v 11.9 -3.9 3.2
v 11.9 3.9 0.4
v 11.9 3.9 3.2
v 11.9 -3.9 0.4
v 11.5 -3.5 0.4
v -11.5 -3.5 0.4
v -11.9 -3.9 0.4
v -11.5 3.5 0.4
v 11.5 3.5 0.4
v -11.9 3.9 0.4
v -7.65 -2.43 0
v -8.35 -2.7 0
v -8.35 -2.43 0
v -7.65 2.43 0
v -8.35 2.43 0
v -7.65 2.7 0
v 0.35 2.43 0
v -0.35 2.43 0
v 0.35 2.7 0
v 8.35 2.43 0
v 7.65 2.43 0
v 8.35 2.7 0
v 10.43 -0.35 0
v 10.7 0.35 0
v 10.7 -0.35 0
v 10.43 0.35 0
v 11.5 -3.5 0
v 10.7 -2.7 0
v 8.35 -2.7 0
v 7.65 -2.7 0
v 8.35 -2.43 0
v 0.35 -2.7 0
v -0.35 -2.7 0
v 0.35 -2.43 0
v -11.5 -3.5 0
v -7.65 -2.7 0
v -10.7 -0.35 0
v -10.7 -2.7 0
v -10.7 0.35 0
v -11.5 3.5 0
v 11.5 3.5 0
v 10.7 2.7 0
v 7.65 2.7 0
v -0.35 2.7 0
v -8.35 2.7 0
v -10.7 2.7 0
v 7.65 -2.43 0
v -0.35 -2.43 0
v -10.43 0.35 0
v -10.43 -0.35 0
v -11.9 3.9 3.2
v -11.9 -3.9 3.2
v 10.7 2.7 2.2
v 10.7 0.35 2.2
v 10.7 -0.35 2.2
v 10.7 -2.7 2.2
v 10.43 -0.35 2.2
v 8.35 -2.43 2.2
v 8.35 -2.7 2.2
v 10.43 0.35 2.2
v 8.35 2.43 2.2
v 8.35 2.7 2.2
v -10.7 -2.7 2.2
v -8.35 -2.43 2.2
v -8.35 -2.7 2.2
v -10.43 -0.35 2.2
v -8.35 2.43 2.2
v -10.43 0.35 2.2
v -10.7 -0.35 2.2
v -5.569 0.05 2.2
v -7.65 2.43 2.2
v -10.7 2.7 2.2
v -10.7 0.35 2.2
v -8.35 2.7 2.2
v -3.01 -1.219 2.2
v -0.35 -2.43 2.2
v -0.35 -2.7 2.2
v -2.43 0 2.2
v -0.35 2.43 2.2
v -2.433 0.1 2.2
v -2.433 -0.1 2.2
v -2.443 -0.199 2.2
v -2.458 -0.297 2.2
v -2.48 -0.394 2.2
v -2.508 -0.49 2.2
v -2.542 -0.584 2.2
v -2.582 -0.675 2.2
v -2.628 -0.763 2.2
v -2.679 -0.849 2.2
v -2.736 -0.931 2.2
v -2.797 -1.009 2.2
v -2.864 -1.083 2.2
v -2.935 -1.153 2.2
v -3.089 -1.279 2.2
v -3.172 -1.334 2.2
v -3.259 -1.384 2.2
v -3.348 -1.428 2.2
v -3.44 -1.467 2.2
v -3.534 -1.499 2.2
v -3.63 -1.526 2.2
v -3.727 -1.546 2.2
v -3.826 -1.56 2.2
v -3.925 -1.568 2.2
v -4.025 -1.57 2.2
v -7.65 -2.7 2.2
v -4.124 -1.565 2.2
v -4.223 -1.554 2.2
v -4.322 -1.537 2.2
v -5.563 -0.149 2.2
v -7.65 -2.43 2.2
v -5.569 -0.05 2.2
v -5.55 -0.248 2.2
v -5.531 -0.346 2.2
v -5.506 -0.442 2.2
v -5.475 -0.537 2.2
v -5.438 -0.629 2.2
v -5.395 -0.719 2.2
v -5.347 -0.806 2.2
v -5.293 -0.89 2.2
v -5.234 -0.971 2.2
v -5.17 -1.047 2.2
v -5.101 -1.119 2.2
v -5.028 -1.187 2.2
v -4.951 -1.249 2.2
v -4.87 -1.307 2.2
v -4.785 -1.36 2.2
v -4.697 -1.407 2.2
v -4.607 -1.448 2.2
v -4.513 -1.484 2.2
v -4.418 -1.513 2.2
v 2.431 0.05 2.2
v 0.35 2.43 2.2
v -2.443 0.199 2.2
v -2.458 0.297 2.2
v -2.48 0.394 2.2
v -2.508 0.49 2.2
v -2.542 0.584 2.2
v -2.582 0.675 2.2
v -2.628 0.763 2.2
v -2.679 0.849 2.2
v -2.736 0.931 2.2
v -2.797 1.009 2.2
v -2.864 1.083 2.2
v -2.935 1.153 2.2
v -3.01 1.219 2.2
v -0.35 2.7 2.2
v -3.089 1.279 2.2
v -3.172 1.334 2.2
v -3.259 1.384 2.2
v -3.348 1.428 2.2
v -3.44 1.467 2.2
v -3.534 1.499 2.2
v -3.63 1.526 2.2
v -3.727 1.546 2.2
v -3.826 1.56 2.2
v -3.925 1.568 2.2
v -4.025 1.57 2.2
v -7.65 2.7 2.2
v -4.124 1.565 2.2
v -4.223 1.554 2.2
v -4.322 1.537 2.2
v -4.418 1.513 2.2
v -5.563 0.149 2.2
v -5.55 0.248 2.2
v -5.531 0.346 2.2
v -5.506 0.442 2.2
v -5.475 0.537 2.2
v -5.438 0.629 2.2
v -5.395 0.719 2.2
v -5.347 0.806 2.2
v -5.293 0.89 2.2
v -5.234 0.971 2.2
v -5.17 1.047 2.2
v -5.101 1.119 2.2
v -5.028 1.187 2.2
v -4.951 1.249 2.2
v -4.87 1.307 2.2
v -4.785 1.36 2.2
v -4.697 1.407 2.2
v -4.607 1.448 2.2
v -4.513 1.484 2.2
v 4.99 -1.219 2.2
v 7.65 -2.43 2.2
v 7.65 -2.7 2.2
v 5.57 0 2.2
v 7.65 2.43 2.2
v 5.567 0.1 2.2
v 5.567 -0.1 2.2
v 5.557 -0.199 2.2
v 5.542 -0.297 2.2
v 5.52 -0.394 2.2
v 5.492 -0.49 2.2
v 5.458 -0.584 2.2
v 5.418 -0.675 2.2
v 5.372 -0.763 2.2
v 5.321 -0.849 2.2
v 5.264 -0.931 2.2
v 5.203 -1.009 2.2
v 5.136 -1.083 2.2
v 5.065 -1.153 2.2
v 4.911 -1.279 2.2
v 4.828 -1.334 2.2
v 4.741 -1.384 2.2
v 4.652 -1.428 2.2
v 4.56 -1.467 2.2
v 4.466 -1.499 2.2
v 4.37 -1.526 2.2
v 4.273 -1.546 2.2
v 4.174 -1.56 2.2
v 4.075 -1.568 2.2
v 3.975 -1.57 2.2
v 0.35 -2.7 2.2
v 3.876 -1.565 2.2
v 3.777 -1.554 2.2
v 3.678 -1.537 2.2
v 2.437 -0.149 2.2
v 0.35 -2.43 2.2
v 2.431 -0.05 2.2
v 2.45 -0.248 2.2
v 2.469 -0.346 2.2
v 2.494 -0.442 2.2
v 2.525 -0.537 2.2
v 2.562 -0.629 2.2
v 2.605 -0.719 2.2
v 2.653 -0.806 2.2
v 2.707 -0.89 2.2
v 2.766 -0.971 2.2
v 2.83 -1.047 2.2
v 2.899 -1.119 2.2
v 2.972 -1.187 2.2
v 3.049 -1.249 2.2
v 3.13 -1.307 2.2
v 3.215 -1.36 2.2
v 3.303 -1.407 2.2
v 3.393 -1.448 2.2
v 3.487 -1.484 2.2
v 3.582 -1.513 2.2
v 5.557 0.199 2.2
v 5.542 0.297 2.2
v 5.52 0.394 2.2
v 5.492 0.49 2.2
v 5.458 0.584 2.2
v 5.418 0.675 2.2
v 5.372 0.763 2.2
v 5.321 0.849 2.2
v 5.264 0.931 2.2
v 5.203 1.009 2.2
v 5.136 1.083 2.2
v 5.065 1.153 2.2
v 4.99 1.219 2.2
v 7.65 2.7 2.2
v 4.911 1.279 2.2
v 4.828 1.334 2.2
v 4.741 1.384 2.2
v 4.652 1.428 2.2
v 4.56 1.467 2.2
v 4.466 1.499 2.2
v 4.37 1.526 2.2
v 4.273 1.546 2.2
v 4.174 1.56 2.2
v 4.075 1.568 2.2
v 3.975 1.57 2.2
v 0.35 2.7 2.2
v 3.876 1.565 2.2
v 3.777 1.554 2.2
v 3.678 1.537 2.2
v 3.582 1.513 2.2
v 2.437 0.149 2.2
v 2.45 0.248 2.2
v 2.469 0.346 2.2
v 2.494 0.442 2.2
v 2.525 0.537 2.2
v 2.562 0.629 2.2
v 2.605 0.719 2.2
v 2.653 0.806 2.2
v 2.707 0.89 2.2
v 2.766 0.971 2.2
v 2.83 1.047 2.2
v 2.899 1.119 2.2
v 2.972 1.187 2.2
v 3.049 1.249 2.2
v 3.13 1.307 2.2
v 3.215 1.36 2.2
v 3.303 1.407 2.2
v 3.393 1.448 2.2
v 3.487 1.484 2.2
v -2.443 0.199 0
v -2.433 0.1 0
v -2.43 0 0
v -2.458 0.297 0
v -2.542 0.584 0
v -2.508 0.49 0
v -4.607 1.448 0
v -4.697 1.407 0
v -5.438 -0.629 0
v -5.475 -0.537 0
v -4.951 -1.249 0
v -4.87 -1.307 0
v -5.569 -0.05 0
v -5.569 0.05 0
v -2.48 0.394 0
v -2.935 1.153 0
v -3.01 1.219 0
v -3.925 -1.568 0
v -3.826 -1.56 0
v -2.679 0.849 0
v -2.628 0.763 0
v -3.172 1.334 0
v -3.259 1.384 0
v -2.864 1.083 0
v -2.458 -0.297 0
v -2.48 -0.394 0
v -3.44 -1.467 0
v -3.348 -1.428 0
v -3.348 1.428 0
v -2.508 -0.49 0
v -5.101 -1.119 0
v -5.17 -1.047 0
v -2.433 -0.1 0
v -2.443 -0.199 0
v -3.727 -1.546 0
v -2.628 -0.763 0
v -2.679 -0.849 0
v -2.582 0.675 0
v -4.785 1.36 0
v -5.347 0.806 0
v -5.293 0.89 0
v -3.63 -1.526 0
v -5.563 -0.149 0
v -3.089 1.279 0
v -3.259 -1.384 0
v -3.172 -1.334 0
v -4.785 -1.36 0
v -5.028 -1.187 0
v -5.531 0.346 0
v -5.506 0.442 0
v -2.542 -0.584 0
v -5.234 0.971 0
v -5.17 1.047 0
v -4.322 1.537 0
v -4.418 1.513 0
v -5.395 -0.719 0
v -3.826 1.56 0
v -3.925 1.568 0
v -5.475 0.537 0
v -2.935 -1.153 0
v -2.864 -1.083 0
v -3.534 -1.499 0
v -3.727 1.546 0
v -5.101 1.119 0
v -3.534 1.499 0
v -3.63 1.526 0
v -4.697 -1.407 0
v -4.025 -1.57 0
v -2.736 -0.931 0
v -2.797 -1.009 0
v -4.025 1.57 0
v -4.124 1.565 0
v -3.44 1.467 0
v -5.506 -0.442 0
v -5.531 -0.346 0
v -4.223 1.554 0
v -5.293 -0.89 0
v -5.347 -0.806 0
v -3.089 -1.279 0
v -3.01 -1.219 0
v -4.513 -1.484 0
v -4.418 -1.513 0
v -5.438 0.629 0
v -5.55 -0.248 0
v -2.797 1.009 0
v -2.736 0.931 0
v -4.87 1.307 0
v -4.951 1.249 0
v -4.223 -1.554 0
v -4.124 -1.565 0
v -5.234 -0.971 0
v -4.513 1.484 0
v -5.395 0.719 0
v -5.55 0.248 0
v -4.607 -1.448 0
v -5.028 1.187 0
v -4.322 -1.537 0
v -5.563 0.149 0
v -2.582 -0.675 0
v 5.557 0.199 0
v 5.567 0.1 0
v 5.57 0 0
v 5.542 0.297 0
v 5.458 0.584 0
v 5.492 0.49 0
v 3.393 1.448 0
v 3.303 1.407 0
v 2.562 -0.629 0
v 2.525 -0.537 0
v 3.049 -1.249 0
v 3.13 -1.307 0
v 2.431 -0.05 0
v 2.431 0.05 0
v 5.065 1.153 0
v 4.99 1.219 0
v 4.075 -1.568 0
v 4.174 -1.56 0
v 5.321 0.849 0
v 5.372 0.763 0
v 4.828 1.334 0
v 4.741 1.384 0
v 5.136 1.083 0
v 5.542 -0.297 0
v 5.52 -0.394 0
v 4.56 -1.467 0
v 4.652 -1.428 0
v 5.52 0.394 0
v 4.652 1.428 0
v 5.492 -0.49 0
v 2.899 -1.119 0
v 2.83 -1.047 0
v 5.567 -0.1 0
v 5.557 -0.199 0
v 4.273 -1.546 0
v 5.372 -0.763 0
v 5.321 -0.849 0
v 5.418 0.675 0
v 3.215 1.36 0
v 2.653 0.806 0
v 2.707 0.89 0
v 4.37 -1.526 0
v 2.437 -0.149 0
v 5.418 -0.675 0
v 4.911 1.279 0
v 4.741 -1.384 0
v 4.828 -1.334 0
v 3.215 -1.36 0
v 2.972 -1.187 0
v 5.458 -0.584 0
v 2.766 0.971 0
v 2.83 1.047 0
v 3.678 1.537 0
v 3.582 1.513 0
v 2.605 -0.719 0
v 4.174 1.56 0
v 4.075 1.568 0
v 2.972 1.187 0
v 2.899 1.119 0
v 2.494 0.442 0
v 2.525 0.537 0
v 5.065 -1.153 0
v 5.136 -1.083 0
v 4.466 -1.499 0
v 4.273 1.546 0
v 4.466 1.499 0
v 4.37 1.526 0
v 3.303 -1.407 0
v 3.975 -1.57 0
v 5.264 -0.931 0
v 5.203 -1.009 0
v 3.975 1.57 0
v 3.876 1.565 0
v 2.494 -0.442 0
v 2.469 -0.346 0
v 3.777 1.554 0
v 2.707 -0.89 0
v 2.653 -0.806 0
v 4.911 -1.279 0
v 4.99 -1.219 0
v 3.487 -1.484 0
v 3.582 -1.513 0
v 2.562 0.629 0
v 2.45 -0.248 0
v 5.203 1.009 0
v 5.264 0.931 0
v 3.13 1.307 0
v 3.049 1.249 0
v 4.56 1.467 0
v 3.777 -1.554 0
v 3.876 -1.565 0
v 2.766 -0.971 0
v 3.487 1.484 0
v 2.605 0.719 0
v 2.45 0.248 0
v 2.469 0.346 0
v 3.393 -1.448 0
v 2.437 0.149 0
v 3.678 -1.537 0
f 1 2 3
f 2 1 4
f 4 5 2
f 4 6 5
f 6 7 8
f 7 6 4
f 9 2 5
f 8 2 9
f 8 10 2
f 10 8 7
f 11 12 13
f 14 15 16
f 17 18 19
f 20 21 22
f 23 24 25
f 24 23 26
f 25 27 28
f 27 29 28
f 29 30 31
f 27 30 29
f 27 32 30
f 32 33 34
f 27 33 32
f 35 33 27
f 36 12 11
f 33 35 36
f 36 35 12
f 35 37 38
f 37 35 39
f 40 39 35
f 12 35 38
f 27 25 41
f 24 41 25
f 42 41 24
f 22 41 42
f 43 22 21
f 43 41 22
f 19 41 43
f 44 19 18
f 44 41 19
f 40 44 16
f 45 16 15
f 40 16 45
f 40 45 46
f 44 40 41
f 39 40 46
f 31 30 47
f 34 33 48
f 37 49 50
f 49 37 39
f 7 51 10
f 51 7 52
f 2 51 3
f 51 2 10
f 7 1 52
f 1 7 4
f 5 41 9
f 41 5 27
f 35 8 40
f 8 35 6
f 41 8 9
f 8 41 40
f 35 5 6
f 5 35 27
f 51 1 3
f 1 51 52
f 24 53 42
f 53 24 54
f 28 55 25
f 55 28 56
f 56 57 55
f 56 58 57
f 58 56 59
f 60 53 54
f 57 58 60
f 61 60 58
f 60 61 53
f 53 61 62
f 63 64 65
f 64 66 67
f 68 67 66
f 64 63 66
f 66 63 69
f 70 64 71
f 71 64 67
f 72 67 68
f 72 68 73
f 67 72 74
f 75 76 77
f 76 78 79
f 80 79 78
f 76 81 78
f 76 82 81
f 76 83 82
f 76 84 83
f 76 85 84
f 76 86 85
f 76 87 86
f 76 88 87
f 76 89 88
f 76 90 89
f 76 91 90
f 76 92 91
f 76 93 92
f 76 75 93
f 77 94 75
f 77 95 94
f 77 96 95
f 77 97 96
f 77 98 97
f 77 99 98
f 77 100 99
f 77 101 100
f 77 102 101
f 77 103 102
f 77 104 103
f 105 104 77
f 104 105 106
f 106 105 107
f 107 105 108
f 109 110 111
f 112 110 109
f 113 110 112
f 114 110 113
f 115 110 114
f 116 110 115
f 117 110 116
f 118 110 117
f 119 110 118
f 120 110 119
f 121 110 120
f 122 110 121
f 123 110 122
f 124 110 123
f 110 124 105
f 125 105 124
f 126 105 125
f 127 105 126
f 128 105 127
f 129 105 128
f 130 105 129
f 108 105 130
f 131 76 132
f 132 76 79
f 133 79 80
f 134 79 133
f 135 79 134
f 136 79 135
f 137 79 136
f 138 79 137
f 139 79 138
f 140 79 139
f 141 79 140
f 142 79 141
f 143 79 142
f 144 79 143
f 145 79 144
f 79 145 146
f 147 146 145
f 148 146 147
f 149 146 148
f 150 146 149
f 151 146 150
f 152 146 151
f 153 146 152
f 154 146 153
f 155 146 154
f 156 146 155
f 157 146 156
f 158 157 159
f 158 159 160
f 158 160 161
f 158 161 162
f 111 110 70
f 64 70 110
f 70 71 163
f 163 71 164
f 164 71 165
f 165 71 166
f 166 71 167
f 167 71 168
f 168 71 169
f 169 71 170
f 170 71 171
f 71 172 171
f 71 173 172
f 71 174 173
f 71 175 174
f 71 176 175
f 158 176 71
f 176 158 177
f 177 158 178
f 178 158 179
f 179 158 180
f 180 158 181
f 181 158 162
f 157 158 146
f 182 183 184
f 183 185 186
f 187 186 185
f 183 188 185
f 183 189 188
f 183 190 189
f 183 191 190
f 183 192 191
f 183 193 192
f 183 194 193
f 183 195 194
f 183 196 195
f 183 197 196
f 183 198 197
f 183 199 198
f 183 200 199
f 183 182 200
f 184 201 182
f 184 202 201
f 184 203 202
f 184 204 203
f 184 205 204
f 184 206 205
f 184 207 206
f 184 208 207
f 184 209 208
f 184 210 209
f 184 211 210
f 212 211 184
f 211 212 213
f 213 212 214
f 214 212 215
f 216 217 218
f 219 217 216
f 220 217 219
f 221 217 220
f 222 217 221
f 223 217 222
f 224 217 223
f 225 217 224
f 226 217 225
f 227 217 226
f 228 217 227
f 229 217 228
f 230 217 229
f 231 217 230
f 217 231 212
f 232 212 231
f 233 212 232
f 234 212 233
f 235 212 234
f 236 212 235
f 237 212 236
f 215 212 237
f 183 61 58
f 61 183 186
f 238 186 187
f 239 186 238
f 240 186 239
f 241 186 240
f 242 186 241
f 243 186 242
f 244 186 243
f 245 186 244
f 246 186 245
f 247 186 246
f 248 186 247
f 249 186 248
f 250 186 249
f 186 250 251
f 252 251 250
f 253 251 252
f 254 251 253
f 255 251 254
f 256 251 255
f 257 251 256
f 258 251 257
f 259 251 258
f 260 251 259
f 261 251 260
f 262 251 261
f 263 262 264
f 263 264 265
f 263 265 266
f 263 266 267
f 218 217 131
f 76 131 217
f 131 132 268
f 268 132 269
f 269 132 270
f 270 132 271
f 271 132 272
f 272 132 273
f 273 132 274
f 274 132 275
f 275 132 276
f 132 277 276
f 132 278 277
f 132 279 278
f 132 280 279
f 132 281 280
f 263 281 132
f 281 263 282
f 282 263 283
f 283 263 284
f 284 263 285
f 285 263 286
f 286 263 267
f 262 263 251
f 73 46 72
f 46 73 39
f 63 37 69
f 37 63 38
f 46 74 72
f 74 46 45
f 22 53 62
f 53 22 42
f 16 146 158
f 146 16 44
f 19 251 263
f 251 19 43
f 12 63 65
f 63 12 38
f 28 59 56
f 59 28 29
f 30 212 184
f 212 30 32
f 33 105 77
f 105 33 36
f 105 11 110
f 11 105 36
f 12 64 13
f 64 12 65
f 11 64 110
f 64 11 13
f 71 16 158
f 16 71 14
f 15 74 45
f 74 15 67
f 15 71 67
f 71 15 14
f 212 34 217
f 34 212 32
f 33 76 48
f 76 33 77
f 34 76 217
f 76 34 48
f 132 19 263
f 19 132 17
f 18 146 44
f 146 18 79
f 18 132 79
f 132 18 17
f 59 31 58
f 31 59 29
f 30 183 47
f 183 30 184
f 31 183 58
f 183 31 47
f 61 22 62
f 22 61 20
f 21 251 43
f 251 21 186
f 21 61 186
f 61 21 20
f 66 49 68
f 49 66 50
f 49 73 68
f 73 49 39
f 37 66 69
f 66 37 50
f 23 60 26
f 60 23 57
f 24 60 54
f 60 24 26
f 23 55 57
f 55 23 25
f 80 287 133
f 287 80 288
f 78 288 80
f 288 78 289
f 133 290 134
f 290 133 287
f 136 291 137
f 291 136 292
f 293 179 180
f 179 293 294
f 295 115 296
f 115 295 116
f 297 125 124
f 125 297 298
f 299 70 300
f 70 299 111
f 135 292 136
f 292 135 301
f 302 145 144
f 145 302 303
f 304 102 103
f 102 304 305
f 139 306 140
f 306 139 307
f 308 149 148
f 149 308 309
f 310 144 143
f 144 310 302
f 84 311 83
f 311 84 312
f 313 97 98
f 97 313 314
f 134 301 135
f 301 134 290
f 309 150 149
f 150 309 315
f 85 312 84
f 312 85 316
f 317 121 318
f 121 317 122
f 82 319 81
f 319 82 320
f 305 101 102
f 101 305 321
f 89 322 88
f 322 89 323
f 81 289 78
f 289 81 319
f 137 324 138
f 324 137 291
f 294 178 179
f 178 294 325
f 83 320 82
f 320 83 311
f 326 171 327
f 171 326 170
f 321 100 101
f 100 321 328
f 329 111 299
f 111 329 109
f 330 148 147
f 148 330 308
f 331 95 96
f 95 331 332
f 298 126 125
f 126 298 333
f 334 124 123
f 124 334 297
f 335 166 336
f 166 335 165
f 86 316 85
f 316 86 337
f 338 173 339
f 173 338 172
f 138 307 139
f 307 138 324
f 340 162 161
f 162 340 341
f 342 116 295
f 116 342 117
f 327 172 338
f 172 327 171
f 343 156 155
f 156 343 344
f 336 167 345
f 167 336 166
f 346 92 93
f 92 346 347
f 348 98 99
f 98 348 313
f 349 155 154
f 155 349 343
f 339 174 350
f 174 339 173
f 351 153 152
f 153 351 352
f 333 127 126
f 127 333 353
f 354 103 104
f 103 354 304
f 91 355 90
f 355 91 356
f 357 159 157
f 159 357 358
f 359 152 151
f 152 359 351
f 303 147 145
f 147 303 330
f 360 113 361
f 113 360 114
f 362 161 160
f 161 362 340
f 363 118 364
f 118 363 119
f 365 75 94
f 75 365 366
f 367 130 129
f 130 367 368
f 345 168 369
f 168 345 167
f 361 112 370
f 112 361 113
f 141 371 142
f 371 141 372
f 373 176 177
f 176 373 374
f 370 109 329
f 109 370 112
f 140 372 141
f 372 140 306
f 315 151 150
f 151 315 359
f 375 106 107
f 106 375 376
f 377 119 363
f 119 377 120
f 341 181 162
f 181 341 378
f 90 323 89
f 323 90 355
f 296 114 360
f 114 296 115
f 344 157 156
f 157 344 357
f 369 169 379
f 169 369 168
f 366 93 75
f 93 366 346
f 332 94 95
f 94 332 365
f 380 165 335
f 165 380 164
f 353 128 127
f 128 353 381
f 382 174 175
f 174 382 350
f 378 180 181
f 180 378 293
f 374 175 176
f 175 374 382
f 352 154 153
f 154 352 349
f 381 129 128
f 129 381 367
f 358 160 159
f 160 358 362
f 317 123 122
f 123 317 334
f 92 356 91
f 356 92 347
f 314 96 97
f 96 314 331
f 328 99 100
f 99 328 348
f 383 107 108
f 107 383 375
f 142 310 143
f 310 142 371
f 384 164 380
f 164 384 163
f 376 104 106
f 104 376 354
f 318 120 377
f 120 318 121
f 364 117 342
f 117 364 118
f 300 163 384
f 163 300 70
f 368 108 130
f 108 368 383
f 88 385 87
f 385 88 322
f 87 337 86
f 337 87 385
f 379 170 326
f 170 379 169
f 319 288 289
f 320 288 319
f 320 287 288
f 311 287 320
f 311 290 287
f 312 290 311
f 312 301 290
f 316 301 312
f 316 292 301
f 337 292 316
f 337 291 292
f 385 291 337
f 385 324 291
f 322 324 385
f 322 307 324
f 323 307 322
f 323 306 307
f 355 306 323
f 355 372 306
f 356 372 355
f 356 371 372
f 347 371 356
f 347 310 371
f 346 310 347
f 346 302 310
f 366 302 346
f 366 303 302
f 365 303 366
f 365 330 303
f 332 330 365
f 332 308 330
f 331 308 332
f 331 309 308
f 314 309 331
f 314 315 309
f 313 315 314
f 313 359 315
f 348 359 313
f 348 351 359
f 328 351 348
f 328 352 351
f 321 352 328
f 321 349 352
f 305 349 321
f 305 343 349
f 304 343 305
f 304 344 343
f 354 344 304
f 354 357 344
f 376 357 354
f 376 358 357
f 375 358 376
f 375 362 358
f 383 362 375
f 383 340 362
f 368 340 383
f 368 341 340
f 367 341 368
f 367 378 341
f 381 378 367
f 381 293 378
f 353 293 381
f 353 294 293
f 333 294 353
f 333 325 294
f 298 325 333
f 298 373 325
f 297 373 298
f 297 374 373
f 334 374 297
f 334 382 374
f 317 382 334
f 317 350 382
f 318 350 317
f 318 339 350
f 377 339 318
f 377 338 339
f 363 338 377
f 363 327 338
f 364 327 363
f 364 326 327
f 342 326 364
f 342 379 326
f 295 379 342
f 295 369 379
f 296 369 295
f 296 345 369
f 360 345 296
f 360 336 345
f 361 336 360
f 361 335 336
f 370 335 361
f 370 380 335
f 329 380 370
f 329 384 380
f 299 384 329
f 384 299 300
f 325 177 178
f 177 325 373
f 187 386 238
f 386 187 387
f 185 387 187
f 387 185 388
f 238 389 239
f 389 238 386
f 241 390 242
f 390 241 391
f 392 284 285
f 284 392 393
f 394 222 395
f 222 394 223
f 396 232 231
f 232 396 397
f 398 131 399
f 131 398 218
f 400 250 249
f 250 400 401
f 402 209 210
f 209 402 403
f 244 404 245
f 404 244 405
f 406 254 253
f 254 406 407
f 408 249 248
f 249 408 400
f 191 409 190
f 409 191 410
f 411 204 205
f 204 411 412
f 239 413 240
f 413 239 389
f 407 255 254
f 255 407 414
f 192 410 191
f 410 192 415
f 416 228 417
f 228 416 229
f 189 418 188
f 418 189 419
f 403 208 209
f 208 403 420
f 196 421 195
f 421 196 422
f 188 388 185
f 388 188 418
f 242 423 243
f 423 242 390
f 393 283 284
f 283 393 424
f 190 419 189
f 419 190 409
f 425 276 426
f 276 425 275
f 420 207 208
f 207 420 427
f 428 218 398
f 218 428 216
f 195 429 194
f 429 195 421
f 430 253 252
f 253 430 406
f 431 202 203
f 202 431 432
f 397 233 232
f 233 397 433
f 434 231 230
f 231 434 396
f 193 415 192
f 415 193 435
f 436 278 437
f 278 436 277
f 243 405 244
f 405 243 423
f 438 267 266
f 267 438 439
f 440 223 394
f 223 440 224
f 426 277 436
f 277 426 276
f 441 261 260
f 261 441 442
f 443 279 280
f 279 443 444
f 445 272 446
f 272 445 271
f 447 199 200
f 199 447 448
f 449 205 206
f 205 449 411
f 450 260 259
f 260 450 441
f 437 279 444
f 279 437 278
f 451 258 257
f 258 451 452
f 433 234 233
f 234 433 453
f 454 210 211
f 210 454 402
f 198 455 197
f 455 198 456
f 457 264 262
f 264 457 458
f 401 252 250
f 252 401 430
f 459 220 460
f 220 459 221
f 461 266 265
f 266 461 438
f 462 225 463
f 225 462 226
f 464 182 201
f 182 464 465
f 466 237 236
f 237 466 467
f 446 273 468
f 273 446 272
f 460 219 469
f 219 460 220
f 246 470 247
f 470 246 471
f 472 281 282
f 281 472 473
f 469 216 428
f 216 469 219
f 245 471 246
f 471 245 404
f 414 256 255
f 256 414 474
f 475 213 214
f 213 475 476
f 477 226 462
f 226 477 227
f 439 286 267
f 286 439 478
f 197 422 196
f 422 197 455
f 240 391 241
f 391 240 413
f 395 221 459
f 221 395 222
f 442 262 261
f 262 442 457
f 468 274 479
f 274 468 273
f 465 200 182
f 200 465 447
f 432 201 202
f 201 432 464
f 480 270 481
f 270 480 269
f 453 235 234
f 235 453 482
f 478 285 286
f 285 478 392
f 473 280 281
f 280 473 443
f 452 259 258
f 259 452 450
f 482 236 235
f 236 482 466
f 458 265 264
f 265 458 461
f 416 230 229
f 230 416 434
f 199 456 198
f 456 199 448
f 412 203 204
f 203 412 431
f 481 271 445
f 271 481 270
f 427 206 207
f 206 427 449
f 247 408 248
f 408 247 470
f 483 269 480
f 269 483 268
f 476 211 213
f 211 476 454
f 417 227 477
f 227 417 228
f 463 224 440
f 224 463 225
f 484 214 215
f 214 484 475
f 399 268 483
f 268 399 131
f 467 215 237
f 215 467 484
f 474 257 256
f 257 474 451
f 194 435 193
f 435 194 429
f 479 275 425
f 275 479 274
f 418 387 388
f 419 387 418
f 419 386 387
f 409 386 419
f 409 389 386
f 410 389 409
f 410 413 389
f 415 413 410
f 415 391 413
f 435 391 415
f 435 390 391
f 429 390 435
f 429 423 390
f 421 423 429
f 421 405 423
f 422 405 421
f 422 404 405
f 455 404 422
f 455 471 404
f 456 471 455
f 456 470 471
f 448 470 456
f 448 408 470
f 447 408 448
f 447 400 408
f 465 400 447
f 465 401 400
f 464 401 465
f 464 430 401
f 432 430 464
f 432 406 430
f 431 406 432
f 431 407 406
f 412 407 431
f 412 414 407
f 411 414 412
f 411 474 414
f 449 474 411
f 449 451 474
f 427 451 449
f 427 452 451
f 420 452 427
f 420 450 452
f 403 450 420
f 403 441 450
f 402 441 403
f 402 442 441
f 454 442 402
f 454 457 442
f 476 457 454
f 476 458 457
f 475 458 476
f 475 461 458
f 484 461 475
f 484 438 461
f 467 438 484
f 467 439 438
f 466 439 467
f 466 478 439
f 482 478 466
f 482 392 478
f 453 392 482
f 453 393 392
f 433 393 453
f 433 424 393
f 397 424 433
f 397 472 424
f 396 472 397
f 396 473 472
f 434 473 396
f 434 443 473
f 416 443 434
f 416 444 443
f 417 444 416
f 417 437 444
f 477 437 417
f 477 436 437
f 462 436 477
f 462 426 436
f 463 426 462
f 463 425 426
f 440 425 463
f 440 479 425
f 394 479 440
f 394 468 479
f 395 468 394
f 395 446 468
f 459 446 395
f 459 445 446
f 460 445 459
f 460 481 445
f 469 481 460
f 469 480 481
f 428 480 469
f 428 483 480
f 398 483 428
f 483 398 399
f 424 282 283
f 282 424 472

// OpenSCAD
use <../LEGO.scad>;

block( width=1, length=3, height=1/3, type="tile" );
